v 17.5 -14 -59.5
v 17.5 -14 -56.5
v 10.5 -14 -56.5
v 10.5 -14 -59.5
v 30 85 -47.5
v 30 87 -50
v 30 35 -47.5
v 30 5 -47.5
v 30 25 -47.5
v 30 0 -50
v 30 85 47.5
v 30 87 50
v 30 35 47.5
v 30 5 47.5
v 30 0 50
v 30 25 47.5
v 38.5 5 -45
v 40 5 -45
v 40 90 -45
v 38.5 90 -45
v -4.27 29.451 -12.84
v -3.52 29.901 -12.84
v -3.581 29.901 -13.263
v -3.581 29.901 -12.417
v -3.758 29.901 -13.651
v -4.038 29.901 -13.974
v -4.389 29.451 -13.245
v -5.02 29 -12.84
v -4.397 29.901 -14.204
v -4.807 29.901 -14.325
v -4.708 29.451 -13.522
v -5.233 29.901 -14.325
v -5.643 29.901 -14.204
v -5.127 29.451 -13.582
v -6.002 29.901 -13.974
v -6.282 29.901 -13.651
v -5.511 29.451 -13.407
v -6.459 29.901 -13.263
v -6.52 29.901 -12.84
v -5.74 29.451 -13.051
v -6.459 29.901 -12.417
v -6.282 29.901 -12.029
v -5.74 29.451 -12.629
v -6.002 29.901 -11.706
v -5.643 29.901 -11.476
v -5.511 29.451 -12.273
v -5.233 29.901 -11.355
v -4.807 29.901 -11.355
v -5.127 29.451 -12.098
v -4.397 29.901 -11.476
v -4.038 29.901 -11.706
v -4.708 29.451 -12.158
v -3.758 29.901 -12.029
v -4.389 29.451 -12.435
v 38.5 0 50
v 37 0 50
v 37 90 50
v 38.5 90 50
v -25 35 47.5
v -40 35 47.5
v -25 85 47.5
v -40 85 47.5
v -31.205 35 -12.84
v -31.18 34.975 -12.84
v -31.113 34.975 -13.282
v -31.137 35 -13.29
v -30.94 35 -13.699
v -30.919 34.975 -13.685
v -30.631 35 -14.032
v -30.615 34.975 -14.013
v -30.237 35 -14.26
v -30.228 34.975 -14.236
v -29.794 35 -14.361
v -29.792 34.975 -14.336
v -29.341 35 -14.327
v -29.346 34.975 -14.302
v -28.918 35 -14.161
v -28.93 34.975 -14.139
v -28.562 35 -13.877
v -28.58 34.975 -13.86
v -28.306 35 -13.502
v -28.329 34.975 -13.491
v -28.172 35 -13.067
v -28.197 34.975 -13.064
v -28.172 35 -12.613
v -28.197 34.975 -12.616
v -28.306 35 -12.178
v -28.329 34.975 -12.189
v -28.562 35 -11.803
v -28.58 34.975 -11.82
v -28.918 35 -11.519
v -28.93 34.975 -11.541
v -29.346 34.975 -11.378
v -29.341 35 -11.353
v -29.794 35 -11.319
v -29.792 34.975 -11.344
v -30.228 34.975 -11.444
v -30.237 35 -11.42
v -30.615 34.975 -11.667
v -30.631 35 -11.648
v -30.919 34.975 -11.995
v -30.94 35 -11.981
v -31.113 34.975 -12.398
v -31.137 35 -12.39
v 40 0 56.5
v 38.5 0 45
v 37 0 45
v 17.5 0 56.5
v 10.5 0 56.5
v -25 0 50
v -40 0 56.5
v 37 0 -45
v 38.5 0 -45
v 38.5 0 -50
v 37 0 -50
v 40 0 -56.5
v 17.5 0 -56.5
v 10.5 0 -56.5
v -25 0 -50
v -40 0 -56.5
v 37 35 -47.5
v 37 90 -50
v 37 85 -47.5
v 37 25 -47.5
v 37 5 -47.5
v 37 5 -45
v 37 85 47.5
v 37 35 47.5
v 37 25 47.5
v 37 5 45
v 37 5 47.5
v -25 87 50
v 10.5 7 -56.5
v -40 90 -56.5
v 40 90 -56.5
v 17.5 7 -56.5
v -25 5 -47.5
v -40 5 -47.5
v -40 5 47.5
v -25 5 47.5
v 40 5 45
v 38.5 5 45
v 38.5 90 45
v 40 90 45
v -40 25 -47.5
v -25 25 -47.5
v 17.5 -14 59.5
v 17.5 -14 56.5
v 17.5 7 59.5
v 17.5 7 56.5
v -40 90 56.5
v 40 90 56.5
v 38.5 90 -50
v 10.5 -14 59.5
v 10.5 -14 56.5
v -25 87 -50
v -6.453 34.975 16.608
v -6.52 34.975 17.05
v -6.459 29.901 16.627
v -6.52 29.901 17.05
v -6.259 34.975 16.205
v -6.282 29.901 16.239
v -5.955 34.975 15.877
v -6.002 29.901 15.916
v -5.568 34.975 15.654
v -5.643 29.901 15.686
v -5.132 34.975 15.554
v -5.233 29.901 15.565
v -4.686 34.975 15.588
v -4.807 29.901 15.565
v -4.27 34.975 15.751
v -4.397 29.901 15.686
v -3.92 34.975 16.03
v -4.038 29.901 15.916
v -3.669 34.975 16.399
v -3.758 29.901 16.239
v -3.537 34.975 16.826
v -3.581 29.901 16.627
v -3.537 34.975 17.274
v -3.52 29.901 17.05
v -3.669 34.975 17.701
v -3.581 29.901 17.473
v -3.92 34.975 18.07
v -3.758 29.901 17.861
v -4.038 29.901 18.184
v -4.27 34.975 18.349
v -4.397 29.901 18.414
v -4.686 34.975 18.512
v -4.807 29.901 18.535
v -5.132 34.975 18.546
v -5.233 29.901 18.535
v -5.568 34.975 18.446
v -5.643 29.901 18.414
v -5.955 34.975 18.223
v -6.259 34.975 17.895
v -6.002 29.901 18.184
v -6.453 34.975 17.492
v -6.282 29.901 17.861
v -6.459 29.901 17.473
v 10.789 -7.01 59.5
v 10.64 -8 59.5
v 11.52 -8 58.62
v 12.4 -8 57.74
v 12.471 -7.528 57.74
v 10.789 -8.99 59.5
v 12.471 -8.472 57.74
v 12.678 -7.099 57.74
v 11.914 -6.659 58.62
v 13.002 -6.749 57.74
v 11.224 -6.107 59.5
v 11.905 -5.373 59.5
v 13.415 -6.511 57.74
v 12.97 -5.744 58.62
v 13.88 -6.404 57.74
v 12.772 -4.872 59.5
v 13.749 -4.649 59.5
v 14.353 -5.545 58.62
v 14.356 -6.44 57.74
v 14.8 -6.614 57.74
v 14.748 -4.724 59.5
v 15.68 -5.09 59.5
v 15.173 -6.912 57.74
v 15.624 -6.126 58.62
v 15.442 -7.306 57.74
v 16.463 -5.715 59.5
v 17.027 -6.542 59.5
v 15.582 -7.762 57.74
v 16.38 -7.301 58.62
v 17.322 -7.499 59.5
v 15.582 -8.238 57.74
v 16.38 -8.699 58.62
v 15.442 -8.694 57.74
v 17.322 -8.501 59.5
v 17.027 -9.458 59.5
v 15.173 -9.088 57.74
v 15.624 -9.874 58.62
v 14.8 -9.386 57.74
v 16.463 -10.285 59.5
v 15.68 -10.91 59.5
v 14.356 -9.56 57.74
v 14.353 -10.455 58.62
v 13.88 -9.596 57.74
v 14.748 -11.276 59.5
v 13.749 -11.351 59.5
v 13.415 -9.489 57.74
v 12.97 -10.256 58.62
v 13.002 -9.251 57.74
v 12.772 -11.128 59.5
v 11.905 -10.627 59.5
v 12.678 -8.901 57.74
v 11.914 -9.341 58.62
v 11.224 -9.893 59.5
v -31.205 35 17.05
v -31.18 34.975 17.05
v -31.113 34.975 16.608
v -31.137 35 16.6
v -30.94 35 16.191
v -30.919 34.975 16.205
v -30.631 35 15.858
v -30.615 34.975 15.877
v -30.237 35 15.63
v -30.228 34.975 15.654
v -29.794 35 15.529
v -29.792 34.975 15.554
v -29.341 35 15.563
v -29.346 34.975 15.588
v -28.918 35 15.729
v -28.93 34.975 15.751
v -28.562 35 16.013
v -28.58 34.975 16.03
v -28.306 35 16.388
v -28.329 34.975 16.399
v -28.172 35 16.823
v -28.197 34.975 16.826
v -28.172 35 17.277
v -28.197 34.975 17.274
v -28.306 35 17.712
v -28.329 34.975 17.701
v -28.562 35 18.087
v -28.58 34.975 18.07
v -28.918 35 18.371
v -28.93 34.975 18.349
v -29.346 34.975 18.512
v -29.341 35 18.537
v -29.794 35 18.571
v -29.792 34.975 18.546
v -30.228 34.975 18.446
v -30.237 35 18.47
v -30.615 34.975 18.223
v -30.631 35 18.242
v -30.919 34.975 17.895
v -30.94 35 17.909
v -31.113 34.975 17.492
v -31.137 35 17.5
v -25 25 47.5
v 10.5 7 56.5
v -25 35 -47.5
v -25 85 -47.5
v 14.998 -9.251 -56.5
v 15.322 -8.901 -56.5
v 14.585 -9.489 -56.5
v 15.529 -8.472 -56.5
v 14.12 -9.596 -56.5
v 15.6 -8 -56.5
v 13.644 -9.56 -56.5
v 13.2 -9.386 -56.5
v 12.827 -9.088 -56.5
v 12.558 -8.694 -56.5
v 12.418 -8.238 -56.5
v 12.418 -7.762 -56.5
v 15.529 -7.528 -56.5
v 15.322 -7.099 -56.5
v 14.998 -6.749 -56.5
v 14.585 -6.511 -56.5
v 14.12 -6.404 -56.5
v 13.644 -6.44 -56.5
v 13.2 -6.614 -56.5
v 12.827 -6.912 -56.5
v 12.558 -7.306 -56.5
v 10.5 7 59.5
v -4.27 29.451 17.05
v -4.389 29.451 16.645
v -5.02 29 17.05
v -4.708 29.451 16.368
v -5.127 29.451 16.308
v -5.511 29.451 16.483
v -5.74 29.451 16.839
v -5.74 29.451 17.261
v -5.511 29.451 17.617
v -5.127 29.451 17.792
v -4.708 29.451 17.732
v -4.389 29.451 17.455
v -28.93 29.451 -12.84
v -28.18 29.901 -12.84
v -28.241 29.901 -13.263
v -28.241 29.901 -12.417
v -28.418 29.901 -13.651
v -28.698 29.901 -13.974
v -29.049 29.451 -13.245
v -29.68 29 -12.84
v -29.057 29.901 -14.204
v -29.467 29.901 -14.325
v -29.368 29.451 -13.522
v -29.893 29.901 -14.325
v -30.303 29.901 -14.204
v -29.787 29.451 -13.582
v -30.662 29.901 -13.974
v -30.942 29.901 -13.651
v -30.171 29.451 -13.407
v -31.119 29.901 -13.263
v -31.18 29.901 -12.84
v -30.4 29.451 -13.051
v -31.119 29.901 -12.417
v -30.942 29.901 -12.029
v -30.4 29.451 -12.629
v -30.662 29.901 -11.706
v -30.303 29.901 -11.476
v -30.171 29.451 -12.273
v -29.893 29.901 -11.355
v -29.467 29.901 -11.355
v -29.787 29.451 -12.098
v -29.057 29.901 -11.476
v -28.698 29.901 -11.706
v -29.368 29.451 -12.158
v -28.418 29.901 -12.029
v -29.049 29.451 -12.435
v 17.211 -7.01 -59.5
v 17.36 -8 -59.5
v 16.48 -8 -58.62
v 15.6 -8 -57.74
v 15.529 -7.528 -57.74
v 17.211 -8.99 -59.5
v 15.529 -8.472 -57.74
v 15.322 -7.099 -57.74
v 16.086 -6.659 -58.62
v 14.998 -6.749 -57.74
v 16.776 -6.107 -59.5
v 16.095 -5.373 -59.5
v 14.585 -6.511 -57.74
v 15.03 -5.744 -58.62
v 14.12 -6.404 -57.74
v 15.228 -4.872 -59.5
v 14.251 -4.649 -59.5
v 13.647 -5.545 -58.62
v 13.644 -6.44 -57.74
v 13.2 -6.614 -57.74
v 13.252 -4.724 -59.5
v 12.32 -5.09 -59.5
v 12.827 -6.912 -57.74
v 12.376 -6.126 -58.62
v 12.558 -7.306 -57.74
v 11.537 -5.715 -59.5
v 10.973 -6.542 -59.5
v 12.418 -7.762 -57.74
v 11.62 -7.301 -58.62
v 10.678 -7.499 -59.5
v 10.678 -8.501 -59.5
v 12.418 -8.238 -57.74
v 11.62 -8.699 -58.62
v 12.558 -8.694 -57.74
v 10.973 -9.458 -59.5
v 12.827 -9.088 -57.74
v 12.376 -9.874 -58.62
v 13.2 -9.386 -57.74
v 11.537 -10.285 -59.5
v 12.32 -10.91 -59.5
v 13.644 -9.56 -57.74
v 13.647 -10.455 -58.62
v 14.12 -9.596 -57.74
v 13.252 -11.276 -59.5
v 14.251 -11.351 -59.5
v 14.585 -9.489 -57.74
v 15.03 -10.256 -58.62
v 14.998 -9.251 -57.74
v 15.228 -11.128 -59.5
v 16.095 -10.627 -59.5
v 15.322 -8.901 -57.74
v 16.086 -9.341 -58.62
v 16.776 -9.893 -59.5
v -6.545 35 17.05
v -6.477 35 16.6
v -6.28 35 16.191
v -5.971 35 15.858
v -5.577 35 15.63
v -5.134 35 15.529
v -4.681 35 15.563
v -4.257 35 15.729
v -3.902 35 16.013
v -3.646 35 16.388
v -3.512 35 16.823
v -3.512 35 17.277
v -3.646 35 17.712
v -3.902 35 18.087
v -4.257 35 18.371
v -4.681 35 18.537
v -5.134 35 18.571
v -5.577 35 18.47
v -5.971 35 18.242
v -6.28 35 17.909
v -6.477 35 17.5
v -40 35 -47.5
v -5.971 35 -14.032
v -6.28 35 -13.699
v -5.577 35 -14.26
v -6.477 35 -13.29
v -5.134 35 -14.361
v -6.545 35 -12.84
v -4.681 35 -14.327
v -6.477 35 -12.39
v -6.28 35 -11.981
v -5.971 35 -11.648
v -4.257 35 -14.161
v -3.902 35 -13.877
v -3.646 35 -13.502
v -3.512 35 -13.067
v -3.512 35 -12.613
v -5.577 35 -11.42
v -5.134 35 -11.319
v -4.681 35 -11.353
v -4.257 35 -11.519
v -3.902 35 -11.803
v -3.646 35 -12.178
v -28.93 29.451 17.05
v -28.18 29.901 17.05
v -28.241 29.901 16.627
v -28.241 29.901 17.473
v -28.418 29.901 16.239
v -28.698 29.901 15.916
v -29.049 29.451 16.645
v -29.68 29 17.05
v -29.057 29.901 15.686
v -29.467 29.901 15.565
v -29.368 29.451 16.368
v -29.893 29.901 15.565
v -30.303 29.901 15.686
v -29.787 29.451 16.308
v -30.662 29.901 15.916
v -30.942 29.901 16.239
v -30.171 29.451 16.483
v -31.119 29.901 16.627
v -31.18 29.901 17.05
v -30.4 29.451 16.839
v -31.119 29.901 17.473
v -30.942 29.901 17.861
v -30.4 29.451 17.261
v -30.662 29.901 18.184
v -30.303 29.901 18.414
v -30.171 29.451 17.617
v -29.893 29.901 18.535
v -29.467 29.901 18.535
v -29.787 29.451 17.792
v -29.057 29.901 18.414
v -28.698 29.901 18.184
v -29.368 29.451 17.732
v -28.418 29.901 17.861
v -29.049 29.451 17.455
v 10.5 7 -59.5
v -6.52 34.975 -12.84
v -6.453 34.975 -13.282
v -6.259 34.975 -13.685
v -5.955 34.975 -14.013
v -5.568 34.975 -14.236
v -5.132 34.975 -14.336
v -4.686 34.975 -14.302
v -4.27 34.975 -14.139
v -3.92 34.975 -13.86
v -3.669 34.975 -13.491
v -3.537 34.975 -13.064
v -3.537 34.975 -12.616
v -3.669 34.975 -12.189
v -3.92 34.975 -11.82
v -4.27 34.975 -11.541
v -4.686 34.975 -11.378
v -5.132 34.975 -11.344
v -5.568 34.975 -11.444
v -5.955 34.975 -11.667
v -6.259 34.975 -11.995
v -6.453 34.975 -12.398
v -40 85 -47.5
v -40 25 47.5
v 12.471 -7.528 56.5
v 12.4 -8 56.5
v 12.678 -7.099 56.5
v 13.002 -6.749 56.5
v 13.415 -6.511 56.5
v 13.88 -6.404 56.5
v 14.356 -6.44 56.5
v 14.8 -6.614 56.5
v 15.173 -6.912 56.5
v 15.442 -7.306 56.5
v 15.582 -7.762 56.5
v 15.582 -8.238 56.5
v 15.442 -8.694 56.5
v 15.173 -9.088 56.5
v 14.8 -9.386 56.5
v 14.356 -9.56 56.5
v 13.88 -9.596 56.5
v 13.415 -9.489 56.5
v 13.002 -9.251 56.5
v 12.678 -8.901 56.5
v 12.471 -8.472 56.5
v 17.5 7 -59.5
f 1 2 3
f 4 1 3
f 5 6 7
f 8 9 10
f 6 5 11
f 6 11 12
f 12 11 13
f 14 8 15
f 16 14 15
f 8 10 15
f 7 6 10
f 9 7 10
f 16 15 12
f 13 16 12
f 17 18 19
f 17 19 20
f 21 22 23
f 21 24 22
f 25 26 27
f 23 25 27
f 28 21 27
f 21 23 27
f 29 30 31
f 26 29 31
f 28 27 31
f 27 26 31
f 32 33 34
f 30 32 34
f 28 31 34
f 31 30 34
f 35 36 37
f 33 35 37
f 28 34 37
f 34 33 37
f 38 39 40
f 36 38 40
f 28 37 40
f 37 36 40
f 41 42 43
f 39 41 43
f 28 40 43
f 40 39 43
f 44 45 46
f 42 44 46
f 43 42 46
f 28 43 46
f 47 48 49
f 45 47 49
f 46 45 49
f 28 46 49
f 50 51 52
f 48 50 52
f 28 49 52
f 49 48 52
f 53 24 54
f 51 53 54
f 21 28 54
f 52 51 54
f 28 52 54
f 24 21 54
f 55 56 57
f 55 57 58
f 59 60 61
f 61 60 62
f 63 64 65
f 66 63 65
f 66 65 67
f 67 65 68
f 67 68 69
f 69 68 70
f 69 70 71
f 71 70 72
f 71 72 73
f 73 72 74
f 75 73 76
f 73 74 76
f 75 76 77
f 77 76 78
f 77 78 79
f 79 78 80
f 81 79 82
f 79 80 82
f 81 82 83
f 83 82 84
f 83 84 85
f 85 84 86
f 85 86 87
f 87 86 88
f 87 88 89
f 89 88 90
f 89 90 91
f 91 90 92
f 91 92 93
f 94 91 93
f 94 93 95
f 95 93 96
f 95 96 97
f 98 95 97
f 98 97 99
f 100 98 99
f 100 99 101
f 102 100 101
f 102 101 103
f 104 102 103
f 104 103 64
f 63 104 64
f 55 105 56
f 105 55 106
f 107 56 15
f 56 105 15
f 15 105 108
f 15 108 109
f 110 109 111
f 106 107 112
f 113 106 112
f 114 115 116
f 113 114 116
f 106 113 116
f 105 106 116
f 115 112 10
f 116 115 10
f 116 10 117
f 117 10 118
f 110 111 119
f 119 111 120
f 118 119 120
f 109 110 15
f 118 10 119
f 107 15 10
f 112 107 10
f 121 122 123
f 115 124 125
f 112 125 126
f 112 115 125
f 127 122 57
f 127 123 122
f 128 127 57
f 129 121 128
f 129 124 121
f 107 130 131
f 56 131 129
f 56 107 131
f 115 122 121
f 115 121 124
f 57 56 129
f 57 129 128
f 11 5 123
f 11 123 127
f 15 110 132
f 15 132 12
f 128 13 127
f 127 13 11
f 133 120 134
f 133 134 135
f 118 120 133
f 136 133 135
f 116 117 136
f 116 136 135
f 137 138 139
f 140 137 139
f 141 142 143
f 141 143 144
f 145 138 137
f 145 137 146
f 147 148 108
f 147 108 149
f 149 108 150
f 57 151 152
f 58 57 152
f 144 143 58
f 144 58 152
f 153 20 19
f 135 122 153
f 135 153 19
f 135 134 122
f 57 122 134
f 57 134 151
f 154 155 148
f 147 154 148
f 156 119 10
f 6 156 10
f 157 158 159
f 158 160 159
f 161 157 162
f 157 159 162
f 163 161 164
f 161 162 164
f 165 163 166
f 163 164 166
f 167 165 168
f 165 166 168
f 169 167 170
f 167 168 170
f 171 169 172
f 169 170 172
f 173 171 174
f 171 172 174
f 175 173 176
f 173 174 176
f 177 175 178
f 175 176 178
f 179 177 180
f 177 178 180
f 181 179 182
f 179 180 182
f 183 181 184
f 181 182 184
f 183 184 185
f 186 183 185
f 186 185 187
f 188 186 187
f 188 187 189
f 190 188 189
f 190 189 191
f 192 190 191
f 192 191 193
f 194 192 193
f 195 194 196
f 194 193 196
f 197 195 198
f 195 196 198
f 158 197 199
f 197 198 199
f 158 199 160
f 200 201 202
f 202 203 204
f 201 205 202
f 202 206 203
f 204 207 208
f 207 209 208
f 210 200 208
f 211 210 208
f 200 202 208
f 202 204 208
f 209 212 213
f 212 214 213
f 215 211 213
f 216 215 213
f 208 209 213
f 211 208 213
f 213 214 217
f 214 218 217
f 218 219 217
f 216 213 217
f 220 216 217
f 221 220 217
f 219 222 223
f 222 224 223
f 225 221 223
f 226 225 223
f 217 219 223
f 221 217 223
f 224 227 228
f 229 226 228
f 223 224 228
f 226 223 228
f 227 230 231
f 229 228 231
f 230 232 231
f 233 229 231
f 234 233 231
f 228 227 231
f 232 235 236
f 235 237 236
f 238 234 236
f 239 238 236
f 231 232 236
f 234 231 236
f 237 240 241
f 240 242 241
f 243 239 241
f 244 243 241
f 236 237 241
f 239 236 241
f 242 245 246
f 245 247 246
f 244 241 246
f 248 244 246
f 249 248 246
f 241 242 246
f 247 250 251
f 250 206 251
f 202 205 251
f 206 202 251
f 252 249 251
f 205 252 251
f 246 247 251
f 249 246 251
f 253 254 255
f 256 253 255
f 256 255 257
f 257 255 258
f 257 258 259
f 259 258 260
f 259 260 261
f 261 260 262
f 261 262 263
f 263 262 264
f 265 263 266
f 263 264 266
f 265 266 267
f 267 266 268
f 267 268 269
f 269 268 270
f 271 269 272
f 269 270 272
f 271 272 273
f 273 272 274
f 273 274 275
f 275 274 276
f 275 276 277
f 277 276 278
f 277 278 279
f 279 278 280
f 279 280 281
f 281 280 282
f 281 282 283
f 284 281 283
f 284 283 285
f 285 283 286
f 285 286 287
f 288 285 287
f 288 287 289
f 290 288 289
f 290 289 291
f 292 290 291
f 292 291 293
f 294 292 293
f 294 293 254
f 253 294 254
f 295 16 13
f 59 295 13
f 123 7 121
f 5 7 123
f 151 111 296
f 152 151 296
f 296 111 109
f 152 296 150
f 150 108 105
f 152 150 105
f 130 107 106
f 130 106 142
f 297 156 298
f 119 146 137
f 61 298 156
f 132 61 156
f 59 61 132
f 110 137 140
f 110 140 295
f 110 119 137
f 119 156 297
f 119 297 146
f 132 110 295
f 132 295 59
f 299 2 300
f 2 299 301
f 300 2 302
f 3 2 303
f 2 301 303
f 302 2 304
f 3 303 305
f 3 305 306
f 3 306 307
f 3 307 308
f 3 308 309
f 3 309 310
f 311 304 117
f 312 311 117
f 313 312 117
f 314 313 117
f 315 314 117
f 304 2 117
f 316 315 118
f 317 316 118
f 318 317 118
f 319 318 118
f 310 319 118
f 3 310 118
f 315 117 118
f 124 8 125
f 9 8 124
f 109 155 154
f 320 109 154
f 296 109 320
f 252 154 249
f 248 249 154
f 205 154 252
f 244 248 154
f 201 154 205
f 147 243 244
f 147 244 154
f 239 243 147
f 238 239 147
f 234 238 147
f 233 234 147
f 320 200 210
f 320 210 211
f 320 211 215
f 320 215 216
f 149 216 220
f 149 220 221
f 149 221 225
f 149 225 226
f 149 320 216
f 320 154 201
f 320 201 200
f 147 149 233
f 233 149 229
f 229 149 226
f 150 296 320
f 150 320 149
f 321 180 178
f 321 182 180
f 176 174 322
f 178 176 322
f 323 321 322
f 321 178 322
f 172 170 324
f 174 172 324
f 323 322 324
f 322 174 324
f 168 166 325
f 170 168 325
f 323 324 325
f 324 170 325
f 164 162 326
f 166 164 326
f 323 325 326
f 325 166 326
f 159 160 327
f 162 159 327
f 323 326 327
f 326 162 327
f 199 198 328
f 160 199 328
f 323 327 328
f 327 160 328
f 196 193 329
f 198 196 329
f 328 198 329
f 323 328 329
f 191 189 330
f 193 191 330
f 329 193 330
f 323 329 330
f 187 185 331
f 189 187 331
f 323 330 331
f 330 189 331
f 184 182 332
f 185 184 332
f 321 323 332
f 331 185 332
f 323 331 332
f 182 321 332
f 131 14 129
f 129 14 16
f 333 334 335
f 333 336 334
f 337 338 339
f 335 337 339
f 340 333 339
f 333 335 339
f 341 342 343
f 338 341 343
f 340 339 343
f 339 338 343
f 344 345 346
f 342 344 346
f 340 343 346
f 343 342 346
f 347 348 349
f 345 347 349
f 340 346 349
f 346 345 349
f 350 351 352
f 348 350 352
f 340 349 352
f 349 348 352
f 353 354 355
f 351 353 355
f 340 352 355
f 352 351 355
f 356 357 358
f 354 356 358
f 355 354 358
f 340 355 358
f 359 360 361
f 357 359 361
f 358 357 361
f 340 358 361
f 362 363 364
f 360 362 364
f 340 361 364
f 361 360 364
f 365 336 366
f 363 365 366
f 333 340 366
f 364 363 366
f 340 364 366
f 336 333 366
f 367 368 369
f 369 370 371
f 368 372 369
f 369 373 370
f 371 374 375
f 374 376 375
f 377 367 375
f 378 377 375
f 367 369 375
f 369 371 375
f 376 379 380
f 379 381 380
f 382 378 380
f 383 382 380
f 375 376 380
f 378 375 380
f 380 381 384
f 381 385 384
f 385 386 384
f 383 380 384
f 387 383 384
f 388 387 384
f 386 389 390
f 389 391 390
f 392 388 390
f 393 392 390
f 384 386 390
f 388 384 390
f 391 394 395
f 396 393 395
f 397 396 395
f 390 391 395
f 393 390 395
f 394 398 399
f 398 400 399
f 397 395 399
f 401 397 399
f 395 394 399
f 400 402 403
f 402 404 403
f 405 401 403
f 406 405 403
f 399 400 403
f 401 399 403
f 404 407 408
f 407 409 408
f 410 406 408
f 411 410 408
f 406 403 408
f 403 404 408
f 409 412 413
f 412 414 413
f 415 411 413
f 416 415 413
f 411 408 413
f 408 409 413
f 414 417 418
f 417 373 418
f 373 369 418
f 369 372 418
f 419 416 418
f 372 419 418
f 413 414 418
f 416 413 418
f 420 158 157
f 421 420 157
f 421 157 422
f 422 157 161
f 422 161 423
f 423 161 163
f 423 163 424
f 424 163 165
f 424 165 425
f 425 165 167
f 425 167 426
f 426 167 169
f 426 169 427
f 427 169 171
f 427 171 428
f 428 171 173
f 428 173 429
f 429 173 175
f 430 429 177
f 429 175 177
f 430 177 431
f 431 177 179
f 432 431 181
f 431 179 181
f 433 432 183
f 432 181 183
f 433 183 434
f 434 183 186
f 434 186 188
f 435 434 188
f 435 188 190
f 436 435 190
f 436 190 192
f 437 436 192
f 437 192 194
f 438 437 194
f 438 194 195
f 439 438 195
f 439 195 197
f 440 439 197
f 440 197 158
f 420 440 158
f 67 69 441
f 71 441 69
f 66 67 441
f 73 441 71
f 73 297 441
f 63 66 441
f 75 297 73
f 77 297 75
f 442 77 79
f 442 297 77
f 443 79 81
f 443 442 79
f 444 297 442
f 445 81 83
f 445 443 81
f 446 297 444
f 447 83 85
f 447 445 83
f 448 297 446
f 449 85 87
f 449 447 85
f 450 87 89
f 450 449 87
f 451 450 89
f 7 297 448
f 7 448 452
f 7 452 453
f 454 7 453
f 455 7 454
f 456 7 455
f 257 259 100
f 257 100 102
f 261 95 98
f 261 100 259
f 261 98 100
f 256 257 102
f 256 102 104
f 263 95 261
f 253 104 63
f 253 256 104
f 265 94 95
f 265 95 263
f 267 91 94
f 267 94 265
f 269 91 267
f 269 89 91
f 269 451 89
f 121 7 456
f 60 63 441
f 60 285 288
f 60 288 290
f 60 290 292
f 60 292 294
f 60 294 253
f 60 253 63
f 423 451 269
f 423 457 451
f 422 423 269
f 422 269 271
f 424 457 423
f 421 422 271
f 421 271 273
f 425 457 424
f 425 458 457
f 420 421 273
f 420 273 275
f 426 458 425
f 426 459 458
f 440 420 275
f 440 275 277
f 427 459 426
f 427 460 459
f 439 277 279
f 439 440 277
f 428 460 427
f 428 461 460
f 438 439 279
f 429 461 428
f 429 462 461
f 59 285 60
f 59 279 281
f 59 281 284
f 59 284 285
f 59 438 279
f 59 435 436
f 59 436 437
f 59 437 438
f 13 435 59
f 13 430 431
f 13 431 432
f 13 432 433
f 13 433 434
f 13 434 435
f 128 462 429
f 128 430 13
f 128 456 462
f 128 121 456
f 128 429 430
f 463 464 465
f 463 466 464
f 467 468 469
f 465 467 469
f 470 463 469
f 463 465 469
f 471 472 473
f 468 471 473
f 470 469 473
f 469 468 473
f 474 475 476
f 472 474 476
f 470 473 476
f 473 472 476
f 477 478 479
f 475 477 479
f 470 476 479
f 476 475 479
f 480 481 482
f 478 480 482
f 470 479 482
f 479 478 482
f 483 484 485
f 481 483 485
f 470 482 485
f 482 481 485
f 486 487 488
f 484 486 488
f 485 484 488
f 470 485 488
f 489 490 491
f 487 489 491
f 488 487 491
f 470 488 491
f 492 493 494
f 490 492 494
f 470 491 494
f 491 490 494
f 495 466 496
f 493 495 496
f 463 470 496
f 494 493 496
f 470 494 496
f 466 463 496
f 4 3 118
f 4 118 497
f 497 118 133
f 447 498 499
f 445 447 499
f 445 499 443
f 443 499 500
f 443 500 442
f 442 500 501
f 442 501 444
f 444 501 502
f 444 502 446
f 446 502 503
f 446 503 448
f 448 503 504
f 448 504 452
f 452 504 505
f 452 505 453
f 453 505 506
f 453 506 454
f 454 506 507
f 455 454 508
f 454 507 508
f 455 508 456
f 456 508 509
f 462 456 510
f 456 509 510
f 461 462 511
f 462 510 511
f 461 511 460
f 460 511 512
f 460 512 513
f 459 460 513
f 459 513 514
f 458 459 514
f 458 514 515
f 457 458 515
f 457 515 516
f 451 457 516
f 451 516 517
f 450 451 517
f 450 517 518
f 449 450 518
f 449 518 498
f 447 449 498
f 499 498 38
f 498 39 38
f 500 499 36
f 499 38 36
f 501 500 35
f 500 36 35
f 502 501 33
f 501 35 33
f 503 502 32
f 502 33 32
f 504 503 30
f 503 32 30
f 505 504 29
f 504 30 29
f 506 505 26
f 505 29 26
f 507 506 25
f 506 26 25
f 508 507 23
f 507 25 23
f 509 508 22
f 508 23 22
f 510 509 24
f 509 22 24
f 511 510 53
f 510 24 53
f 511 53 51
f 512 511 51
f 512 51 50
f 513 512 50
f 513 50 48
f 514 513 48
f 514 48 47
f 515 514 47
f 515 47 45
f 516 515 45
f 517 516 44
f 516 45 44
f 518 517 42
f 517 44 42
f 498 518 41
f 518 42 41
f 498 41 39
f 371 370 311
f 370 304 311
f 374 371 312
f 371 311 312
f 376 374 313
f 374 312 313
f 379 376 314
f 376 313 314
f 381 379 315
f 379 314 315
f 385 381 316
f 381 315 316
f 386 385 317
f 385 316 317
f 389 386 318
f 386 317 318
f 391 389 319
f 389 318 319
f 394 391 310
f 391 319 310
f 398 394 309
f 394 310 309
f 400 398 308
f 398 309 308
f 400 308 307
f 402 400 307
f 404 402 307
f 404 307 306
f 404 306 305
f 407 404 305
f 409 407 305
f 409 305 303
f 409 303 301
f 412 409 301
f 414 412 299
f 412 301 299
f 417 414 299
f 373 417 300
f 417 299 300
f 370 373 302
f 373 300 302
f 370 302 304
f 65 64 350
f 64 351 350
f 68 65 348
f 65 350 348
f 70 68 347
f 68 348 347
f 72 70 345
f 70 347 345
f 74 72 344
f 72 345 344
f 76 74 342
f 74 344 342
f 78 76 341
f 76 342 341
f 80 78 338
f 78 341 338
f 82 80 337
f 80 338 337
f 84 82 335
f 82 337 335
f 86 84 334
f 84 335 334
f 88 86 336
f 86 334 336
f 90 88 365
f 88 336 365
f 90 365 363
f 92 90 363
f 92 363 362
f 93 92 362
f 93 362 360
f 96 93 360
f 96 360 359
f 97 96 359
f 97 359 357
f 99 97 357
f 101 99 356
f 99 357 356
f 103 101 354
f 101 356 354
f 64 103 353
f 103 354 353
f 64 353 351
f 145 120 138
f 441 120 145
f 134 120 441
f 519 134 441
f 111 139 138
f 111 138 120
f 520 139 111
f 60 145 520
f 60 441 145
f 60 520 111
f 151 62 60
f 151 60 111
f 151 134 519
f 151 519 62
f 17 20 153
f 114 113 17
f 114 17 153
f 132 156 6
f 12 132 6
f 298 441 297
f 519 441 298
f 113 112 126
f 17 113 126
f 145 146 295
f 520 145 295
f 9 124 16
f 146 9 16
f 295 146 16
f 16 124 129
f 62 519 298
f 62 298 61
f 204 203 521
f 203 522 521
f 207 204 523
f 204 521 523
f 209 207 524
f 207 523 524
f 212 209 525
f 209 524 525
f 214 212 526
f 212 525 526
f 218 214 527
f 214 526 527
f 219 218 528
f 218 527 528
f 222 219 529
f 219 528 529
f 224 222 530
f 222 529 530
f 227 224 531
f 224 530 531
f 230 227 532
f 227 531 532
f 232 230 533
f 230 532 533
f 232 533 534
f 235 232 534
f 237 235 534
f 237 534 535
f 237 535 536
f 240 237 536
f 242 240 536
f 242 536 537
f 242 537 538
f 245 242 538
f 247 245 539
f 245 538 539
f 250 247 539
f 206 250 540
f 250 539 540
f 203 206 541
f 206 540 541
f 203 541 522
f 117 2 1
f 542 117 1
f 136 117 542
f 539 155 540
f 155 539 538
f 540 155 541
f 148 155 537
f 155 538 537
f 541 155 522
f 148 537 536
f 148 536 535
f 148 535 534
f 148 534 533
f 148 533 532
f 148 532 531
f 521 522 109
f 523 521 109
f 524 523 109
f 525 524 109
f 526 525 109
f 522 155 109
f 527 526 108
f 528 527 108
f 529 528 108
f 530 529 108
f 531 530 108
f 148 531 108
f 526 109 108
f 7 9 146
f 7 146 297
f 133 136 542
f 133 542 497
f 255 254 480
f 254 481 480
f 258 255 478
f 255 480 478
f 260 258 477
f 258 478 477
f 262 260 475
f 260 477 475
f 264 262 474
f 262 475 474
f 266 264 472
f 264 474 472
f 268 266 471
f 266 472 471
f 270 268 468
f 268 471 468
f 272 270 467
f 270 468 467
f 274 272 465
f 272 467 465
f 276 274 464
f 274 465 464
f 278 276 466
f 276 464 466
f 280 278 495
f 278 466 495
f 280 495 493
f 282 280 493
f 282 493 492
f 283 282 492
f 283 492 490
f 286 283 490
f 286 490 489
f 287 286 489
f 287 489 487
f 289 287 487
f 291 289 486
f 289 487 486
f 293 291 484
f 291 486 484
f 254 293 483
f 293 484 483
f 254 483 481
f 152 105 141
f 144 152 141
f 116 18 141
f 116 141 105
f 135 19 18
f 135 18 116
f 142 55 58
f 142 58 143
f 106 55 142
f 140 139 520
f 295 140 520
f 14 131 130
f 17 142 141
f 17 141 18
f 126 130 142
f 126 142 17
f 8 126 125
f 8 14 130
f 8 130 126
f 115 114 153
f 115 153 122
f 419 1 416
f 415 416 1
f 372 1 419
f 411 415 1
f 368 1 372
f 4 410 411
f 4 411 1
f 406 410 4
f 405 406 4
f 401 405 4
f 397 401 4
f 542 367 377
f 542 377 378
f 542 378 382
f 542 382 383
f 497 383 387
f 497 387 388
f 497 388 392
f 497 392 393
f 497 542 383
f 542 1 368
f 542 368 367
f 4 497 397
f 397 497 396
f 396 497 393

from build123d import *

# Parameters (mm, degrees)
SKETCH1_W                                            = 80
SKETCH1_H                                            = 113
BOSS_EXTRUDE1_DEPTH                                  = 90
SKETCH3_W                                            = 55
SKETCH3_H                                            = 100
CUT_EXTRUDE2_DEPTH                                   = 87
SKETCH4_W                                            = 95
SKETCH4_H                                            = 80
CUT_EXTRUDE3_DEPTH                                   = 77
SKETCH6_W                                            = 95
SKETCH6_H                                            = 10
BOSS_EXTRUDE4_DEPTH                                  = 77
CUT_EXTRUDE4_DEPTH                                   = 91
F_3_0_3_DIAMETER_HOLE1_D                             = 3
F_3_0_3_DIAMETER_HOLE1_DEPTH                         = 5.098709071
F_3_0_3_DIAMETER_HOLE1_CSINK_D                       = 3.05
F_3_0_3_DIAMETER_HOLE1_CSINK_ANGLE                   = 90
F_3_0_3_DIAMETER_HOLE1_TIP                           = 0.901290929
SKETCH11_W                                           = 90
SKETCH11_H                                           = 5
BOSS_EXTRUDE5_DEPTH                                  = 3
SKETCH12_W                                           = 7
SKETCH12_H                                           = 21
BOSS_EXTRUDE6_DEPTH                                  = 3
SKETCH13_W                                           = 7
SKETCH13_H                                           = 21
BOSS_EXTRUDE7_DEPTH                                  = 3
CSK_FOR_M3_HEX_SOCKET_COUNTERSUNK_CAP_SC_D           = 3.2
CSK_FOR_M3_HEX_SOCKET_COUNTERSUNK_CAP_SC_DEPTH       = 7.23862301
CSK_FOR_M3_HEX_SOCKET_COUNTERSUNK_CAP_SC_CSINK_D     = 6.72
CSK_FOR_M3_HEX_SOCKET_COUNTERSUNK_CAP_SC_CSINK_ANGLE = 90
CSK_FOR_M3_HEX_SOCKET_COUNTERSUNK_CAP_SC_TIP         = 0.96137699
CSK_FOR_M3_HEX_SOCKET_COUNTERSUNK_CA_2_D             = 3.2
CSK_FOR_M3_HEX_SOCKET_COUNTERSUNK_CA_2_DEPTH         = 7.23862301
CSK_FOR_M3_HEX_SOCKET_COUNTERSUNK_CA_2_CSINK_D       = 6.72
CSK_FOR_M3_HEX_SOCKET_COUNTERSUNK_CA_2_CSINK_ANGLE   = 90
CSK_FOR_M3_HEX_SOCKET_COUNTERSUNK_CA_2_TIP           = 0.96137699


with BuildPart() as part:
    # Sketch1 → Boss-Extrude1 (new body)
    with BuildSketch(Plane(origin=(0, 0, 0), x_dir=(1, 0, 0), z_dir=(0, 1, 0))):
        Rectangle(SKETCH1_W, SKETCH1_H)
    extrude(amount=BOSS_EXTRUDE1_DEPTH)

    # Sketch3 → Cut-Extrude2 (cut)
    with BuildSketch(Plane.XZ):
        with Locations((2.5, 0)):
            Rectangle(SKETCH3_W, SKETCH3_H)
    extrude(amount=-CUT_EXTRUDE2_DEPTH, mode=Mode.SUBTRACT)

    # Sketch4 → Cut-Extrude3 (cut)
    with BuildSketch(Plane.ZY.offset(40)):
        with Locations((0, 45)):
            Rectangle(SKETCH4_W, SKETCH4_H)
    extrude(amount=-CUT_EXTRUDE3_DEPTH, mode=Mode.SUBTRACT)

    # Sketch6 → Boss-Extrude4 (add)
    with BuildSketch(Plane.ZY.offset(-37)):
        with Locations((0, 30)):
            Rectangle(SKETCH6_W, SKETCH6_H)
    extrude(amount=BOSS_EXTRUDE4_DEPTH)

    # Sketch7 → Cut-Extrude4 (cut, through all)
    with BuildSketch(Plane(origin=(0, 0, 0), x_dir=(1, 0, 0), z_dir=(0, 1, 0))):
        Polygon((40, 45), (38.5, 45), (38.5, 50), (37, 50), (37, -50), (38.5, -50), (38.5, -45), (40, -45), align=None)
    extrude(amount=CUT_EXTRUDE4_DEPTH, mode=Mode.SUBTRACT)

    # Ø3.0 (3) Diameter Hole1
    with Locations(Plane(origin=(0, 35, 0), x_dir=(1, 0, 0), z_dir=(0, 1, 0))):
        with Locations((-5.02, -17.05), (-5.02, 12.84), (-29.68, 12.84), (-29.68, -17.05)):
            CounterSinkHole(F_3_0_3_DIAMETER_HOLE1_D / 2, F_3_0_3_DIAMETER_HOLE1_CSINK_D / 2, depth=F_3_0_3_DIAMETER_HOLE1_DEPTH, counter_sink_angle=F_3_0_3_DIAMETER_HOLE1_CSINK_ANGLE)
            with Locations((0, 0, -(F_3_0_3_DIAMETER_HOLE1_DEPTH + F_3_0_3_DIAMETER_HOLE1_TIP / 2))):  # 118° drill point
                Cone(0, F_3_0_3_DIAMETER_HOLE1_D / 2, F_3_0_3_DIAMETER_HOLE1_TIP, mode=Mode.SUBTRACT)

    # Sketch11 → Boss-Extrude5 (add, through all)
    with BuildSketch(Plane(origin=(37, 0, 0), x_dir=(0, 0, -1), z_dir=(1, 0, 0))):
        with Locations((0, 2.5)):
            Rectangle(SKETCH11_W, SKETCH11_H)
    extrude(amount=BOSS_EXTRUDE5_DEPTH)

    # Sketch12 → Boss-Extrude6 (add)
    with BuildSketch(Plane.XY.offset(56.5)):
        with Locations((14, -3.5)):
            Rectangle(SKETCH12_W, SKETCH12_H)
    extrude(amount=BOSS_EXTRUDE6_DEPTH)

    # Sketch13 → Boss-Extrude7 (add)
    with BuildSketch(Plane(origin=(0, 0, -56.5), x_dir=(-1, 0, 0), z_dir=(0, 0, -1))):
        with Locations((-14, -3.5)):
            Rectangle(SKETCH13_W, SKETCH13_H)
    extrude(amount=BOSS_EXTRUDE7_DEPTH)

    # CSK for M3 Hex Socket Countersunk Cap Sc
    with Locations(Plane(origin=(0, 0, -59.5), x_dir=(-1, 0, 0), z_dir=(0, 0, -1))):
        with Locations((-14, -8)):
            CounterSinkHole(CSK_FOR_M3_HEX_SOCKET_COUNTERSUNK_CAP_SC_D / 2, CSK_FOR_M3_HEX_SOCKET_COUNTERSUNK_CAP_SC_CSINK_D / 2, depth=CSK_FOR_M3_HEX_SOCKET_COUNTERSUNK_CAP_SC_DEPTH, counter_sink_angle=CSK_FOR_M3_HEX_SOCKET_COUNTERSUNK_CAP_SC_CSINK_ANGLE)
            with Locations((0, 0, -(CSK_FOR_M3_HEX_SOCKET_COUNTERSUNK_CAP_SC_DEPTH + CSK_FOR_M3_HEX_SOCKET_COUNTERSUNK_CAP_SC_TIP / 2))):  # 118° drill point
                Cone(0, CSK_FOR_M3_HEX_SOCKET_COUNTERSUNK_CAP_SC_D / 2, CSK_FOR_M3_HEX_SOCKET_COUNTERSUNK_CAP_SC_TIP, mode=Mode.SUBTRACT)

    # CSK for M3 Hex Socket Countersunk Ca 2
    with Locations(Plane.XY.offset(59.5)):
        with Locations((14, -8)):
            CounterSinkHole(CSK_FOR_M3_HEX_SOCKET_COUNTERSUNK_CA_2_D / 2, CSK_FOR_M3_HEX_SOCKET_COUNTERSUNK_CA_2_CSINK_D / 2, depth=CSK_FOR_M3_HEX_SOCKET_COUNTERSUNK_CA_2_DEPTH, counter_sink_angle=CSK_FOR_M3_HEX_SOCKET_COUNTERSUNK_CA_2_CSINK_ANGLE)
            with Locations((0, 0, -(CSK_FOR_M3_HEX_SOCKET_COUNTERSUNK_CA_2_DEPTH + CSK_FOR_M3_HEX_SOCKET_COUNTERSUNK_CA_2_TIP / 2))):  # 118° drill point
                Cone(0, CSK_FOR_M3_HEX_SOCKET_COUNTERSUNK_CA_2_D / 2, CSK_FOR_M3_HEX_SOCKET_COUNTERSUNK_CA_2_TIP, mode=Mode.SUBTRACT)


solid = part.part
